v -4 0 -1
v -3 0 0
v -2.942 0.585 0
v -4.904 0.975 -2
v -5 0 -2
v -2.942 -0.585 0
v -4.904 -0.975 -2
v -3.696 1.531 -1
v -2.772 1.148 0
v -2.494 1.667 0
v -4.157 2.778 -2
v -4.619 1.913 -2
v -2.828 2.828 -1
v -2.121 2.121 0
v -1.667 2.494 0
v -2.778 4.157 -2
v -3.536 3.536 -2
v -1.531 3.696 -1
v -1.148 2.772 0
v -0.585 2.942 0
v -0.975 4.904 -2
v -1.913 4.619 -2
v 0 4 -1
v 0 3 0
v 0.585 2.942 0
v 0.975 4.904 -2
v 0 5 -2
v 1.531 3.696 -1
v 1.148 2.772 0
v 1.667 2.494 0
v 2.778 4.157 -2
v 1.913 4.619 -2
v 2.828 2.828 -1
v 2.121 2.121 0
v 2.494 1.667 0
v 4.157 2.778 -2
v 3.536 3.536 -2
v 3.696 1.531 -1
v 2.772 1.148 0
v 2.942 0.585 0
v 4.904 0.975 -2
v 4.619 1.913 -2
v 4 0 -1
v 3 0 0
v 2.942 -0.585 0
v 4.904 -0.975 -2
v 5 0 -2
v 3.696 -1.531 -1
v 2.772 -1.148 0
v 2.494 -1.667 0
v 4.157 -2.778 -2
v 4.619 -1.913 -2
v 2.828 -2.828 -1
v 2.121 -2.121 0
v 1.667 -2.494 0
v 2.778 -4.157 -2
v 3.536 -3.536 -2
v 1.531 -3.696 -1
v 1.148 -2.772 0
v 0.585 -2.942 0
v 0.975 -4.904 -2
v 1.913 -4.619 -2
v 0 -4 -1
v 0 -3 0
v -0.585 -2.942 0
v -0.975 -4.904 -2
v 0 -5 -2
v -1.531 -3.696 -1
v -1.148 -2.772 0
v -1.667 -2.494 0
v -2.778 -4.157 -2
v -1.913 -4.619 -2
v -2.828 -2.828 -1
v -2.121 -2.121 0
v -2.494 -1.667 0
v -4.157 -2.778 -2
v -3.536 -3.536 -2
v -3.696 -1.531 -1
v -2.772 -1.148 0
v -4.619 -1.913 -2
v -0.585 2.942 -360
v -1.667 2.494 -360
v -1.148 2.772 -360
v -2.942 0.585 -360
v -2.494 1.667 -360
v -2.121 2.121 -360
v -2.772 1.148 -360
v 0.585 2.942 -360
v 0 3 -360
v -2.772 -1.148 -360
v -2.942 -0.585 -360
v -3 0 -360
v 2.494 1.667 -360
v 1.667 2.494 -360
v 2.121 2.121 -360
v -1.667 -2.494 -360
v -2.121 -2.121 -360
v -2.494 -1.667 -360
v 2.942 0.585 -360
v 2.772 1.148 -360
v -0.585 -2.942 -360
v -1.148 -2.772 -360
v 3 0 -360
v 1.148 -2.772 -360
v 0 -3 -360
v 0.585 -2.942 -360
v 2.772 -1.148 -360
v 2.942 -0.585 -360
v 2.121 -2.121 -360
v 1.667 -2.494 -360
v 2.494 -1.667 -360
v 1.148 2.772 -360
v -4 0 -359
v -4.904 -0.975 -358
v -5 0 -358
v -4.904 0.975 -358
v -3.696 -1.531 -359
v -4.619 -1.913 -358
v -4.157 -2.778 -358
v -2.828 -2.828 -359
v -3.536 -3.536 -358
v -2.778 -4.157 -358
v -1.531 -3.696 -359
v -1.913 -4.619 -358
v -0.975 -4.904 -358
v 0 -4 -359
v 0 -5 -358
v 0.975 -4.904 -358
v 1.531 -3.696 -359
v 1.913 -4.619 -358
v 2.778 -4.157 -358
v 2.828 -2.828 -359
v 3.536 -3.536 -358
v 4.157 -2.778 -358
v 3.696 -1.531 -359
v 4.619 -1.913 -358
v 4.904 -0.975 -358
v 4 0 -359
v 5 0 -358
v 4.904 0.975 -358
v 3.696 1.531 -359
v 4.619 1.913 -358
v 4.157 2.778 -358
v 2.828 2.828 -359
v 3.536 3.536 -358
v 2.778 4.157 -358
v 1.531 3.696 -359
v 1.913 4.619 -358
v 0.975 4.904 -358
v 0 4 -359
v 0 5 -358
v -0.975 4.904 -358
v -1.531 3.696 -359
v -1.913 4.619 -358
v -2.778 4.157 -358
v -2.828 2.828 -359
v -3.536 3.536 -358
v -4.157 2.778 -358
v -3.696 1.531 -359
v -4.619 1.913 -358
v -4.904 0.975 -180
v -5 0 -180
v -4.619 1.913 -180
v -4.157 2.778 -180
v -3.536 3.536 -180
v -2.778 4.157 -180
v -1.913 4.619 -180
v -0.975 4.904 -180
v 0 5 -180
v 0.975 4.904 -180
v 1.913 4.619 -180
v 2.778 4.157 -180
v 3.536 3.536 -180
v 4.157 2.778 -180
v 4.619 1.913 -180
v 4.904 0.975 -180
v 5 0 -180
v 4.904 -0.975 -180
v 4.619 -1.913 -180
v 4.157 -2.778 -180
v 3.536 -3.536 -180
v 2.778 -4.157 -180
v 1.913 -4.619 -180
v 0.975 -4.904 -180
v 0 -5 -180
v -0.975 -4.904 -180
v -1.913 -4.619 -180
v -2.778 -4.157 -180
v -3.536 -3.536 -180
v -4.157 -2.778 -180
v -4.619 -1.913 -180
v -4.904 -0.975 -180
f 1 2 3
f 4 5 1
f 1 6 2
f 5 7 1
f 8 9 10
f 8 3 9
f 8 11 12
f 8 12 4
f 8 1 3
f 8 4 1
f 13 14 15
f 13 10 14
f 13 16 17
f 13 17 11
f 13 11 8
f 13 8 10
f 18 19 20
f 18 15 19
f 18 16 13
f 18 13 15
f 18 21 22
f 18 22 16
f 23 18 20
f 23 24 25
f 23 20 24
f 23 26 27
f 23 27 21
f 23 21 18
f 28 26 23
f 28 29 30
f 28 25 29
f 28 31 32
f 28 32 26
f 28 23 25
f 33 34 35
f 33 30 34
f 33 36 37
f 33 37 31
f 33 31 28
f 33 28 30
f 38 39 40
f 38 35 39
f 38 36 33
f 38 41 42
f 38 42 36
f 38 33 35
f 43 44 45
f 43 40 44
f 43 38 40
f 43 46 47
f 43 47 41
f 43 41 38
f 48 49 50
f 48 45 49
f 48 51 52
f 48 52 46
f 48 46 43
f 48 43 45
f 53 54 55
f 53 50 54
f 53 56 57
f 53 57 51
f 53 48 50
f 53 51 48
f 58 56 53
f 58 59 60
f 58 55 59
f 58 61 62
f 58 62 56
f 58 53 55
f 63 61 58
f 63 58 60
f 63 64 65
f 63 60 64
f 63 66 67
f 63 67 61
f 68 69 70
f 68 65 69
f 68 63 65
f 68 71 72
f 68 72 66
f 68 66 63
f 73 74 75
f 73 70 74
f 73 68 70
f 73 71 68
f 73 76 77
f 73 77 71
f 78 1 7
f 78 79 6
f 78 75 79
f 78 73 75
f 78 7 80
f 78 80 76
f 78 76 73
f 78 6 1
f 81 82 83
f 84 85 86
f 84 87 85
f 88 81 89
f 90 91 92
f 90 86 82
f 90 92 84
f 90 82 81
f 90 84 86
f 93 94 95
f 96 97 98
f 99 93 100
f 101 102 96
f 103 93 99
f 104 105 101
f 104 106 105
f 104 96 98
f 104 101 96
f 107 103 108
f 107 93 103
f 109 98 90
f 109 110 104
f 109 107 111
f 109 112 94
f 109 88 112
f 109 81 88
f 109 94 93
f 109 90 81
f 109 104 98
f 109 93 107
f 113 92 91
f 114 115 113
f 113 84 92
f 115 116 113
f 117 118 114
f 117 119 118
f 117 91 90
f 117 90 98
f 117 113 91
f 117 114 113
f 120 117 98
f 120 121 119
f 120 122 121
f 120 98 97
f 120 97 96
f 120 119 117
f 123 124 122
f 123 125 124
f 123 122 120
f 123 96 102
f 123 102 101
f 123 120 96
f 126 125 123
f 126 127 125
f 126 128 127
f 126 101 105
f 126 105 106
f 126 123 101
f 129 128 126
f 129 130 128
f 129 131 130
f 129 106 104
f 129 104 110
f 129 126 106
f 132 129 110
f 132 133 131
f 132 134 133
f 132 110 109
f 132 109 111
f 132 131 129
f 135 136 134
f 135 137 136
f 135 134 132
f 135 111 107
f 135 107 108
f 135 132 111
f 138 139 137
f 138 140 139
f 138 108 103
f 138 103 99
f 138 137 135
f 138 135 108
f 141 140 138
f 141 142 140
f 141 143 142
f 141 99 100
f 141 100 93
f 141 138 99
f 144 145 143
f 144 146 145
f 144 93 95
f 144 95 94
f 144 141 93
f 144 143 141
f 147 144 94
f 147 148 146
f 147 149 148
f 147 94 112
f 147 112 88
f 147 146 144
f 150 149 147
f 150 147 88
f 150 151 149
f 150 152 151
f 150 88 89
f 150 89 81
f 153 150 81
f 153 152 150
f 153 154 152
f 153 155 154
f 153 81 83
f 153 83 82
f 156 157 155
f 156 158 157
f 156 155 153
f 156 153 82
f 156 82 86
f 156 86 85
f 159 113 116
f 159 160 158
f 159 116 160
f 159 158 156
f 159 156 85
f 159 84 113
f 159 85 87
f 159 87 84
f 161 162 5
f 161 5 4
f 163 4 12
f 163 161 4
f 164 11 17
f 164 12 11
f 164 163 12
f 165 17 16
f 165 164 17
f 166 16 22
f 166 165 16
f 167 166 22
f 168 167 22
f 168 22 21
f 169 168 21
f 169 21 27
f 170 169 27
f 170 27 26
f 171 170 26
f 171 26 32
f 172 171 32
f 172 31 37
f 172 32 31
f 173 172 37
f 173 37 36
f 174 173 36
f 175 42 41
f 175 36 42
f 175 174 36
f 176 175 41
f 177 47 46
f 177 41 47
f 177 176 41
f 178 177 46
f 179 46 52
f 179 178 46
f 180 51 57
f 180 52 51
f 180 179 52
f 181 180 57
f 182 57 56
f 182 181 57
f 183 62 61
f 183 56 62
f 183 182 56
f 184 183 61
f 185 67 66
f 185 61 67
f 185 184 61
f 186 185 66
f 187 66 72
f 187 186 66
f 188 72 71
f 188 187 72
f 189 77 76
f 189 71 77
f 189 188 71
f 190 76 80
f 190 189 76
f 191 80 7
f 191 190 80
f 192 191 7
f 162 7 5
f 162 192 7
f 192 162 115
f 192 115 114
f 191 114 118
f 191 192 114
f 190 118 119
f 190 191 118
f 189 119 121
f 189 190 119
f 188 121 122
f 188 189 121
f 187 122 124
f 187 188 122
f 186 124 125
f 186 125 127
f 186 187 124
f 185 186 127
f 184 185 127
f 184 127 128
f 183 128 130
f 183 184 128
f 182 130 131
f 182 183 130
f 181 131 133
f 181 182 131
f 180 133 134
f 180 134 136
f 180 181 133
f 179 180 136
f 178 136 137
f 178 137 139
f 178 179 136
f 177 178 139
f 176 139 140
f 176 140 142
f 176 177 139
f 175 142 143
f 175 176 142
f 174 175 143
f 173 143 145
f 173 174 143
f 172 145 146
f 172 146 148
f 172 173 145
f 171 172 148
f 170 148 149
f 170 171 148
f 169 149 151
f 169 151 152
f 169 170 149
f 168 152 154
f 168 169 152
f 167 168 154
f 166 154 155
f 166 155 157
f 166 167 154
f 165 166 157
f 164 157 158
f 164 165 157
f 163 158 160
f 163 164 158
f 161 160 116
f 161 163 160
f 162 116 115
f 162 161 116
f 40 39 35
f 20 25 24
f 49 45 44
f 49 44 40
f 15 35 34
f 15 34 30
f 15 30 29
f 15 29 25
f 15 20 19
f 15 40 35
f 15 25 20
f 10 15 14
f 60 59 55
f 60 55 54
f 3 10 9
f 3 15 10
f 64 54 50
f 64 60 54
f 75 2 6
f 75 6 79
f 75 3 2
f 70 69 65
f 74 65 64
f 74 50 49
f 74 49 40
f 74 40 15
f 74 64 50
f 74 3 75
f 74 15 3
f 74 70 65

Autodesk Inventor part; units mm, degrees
ref_plane "YZ Plane" through (0, 0, 0) normal (1, 0, 0) x (0, 1, 0)
ref_plane "XZ Plane" through (0, 0, 0) normal (0, 1, 0) x (-1, 0, 0)
ref_plane "XY Plane" through (0, 0, 0) normal (0, 0, 1) x (1, 0, 0)
sketch "Skizze1" plane through (0, 0, 0) normal (0, 1, 0) x (-1, 0, 0)
  line L0 (0, 0) -> (5, 0)
  line L1 (5, 0) -> (5, -180)
  line L2 (5, -180) -> (0, -180)
  line L3 (0, -180) -> (0, 0)
  dimension "d0" = 180
  dimension "d1" = 10
revolve "Umdrehung1" add sketch "Skizze1" angle 360 about axis through (0, 0, -180) along (0, 0, 1)
thread "Gewinde1" size "M10x1.5" class "6g" standard "ISO Metric profile" length 15
chamfer "Fase1" distance 2 angle 45 1 edges at (5, 0, 0)
mirror "Spiegeln1" about plane through (0, 0, -180) normal (0, 0, -1)
properties part number "Gewindestange_360" material "Stahl AISI 4130"
